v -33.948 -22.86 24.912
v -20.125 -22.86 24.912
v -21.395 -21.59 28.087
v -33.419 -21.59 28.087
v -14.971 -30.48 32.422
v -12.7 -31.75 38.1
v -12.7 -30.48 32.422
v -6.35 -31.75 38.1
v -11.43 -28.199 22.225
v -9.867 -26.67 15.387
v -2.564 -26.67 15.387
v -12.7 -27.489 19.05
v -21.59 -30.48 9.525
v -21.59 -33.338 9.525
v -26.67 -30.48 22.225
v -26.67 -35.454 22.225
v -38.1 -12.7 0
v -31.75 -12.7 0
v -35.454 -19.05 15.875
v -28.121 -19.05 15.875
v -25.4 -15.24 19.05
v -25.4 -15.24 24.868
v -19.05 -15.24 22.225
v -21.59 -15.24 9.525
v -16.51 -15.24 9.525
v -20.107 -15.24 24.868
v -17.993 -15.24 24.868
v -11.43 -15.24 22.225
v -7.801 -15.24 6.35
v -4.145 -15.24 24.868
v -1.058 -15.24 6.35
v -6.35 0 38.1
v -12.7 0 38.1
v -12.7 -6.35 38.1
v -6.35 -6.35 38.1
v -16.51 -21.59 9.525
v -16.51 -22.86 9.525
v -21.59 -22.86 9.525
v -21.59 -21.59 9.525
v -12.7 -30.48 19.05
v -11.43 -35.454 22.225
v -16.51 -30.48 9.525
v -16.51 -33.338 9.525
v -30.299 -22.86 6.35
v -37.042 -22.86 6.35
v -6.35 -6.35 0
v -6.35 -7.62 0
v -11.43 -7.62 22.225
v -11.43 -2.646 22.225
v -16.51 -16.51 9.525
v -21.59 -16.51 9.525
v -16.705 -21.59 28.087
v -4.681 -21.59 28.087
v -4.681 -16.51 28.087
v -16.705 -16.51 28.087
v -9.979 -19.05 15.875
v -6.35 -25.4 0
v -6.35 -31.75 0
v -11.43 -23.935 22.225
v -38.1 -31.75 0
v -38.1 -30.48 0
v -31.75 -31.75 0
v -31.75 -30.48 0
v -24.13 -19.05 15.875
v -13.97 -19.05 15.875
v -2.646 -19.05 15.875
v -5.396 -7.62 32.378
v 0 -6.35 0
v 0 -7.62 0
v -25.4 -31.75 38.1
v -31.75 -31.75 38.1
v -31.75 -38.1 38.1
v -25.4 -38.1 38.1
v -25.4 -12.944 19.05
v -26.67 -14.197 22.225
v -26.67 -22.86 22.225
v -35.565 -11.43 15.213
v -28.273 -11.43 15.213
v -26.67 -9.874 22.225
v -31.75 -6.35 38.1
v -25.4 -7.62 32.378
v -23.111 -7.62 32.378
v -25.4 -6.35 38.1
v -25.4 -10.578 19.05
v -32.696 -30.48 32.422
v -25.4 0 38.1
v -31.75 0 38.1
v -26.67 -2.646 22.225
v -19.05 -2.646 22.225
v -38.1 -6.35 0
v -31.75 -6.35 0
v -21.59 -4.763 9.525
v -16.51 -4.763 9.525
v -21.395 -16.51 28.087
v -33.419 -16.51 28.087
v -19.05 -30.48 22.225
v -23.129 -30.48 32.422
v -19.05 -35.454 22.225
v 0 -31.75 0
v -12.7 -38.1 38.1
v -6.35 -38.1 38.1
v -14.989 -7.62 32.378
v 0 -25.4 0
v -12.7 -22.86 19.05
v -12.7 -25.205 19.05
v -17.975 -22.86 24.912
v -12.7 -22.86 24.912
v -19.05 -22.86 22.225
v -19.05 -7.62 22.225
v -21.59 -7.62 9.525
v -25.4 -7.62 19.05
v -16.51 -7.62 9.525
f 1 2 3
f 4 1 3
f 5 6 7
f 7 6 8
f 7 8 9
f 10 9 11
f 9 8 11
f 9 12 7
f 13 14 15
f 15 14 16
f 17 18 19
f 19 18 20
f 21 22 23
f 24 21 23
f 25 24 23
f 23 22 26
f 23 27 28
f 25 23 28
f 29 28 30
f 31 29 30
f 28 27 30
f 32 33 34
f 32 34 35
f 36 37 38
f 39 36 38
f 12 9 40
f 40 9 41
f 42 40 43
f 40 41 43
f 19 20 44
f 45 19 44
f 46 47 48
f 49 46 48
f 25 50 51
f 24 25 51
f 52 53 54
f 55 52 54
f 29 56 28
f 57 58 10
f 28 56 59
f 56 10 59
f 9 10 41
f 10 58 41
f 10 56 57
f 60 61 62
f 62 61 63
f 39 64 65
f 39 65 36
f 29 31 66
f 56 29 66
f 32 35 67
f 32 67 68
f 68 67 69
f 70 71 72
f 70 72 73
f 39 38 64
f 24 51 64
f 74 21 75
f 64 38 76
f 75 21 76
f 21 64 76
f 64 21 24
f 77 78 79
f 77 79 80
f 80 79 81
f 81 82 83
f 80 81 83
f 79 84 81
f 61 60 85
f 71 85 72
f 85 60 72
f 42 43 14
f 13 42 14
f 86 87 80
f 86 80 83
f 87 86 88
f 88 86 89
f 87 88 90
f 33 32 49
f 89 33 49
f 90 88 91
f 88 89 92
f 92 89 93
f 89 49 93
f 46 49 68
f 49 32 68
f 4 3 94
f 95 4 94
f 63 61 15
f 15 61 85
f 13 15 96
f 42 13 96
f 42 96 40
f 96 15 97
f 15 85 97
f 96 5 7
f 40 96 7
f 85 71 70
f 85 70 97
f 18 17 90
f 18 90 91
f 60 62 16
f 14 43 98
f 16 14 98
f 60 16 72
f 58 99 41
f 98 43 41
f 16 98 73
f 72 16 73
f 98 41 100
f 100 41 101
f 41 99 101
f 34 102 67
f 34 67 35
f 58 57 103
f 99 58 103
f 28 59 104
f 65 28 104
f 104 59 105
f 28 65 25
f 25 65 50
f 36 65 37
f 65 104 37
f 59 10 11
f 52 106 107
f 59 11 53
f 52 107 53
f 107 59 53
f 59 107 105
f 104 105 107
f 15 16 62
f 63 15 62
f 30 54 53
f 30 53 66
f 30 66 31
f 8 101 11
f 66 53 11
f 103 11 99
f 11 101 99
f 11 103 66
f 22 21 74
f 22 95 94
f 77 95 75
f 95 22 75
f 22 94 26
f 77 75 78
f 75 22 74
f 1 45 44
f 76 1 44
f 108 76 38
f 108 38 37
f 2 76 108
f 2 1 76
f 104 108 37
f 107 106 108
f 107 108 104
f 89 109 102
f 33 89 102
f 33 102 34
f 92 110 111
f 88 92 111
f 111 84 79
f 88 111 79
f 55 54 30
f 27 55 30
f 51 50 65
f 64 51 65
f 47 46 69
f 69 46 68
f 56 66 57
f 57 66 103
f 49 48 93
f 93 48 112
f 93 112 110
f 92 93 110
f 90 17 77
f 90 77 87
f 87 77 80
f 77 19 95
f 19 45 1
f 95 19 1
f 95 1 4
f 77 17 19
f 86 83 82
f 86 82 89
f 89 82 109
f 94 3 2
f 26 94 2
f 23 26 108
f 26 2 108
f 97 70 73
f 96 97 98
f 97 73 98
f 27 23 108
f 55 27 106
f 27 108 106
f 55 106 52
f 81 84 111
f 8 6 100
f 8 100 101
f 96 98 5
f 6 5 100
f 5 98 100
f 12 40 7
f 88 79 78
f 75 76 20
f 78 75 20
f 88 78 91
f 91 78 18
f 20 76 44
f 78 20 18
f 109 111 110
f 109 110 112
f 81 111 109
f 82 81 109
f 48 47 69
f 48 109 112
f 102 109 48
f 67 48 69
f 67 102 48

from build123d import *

# Parameters (mm, degrees)
F0_W      = 38.1
F0_H      = 38.1
F1_DEPTH  = 38.1
F6_DEPTH  = 76.2
F8_DEPTH  = 76.2
F9_W      = 25.4
F9_H      = 7.62
F10_DEPTH = 76.2


with BuildPart() as f1:
    # F0 (on Front) → F1 (new body)
    with BuildSketch(Plane.XZ):
        with Locations((-19.05, 19.05)):
            Rectangle(F0_W, F0_H)
    extrude(amount=F1_DEPTH)

    # F5 (on offset) → F6 (cut)
    with BuildSketch(Plane.YZ.offset(38.1)):
        Polygon((-11.43, 15.2127137408), (-6.35, 38.1), (-31.75, 38.1), (-26.67, 15.3867928311), (-21.59, 28.0867928311), (-16.51, 28.0867928311), align=None)
        Polygon((-31.75, 0), (-38.1, 38.1), (-38.1, 0), align=None)
        Polygon((-25.4, 0), (-12.7, 0), (-19.05, 15.875), align=None)
        Polygon((-6.35, 0), (0, 0), (0, 38.1), align=None)
    extrude(amount=-F6_DEPTH, mode=Mode.SUBTRACT)

    # F7 (on offset) → F8 (cut)
    with BuildSketch(Plane.XZ.offset(38.1)):
        Polygon((-19.05, 22.225), (-12.7, 38.1), (-25.4, 38.1), align=None)
        Polygon((-38.1, 38.1), (-38.1, 0), (-31.75, 38.1), align=None)
        Polygon((-31.75, 0), (-6.35, 0), (-11.43, 22.225), (-16.51, 9.525), (-21.59, 9.525), (-26.67, 22.225), align=None)
        Polygon((-6.35, 38.1), (0, 0), (0, 38.1), align=None)
    extrude(amount=-F8_DEPTH, mode=Mode.SUBTRACT)

    # F9 (on offset) → F10 (cut)
    with BuildSketch(Plane.XY.offset(38.1)):
        with Locations((-25.4, -26.67)):
            Rectangle(F9_W, F9_H)
        with Locations((-12.7, -11.43)):
            Rectangle(F9_W, F9_H)
    extrude(amount=-F10_DEPTH, mode=Mode.SUBTRACT)


solid = f1.part
